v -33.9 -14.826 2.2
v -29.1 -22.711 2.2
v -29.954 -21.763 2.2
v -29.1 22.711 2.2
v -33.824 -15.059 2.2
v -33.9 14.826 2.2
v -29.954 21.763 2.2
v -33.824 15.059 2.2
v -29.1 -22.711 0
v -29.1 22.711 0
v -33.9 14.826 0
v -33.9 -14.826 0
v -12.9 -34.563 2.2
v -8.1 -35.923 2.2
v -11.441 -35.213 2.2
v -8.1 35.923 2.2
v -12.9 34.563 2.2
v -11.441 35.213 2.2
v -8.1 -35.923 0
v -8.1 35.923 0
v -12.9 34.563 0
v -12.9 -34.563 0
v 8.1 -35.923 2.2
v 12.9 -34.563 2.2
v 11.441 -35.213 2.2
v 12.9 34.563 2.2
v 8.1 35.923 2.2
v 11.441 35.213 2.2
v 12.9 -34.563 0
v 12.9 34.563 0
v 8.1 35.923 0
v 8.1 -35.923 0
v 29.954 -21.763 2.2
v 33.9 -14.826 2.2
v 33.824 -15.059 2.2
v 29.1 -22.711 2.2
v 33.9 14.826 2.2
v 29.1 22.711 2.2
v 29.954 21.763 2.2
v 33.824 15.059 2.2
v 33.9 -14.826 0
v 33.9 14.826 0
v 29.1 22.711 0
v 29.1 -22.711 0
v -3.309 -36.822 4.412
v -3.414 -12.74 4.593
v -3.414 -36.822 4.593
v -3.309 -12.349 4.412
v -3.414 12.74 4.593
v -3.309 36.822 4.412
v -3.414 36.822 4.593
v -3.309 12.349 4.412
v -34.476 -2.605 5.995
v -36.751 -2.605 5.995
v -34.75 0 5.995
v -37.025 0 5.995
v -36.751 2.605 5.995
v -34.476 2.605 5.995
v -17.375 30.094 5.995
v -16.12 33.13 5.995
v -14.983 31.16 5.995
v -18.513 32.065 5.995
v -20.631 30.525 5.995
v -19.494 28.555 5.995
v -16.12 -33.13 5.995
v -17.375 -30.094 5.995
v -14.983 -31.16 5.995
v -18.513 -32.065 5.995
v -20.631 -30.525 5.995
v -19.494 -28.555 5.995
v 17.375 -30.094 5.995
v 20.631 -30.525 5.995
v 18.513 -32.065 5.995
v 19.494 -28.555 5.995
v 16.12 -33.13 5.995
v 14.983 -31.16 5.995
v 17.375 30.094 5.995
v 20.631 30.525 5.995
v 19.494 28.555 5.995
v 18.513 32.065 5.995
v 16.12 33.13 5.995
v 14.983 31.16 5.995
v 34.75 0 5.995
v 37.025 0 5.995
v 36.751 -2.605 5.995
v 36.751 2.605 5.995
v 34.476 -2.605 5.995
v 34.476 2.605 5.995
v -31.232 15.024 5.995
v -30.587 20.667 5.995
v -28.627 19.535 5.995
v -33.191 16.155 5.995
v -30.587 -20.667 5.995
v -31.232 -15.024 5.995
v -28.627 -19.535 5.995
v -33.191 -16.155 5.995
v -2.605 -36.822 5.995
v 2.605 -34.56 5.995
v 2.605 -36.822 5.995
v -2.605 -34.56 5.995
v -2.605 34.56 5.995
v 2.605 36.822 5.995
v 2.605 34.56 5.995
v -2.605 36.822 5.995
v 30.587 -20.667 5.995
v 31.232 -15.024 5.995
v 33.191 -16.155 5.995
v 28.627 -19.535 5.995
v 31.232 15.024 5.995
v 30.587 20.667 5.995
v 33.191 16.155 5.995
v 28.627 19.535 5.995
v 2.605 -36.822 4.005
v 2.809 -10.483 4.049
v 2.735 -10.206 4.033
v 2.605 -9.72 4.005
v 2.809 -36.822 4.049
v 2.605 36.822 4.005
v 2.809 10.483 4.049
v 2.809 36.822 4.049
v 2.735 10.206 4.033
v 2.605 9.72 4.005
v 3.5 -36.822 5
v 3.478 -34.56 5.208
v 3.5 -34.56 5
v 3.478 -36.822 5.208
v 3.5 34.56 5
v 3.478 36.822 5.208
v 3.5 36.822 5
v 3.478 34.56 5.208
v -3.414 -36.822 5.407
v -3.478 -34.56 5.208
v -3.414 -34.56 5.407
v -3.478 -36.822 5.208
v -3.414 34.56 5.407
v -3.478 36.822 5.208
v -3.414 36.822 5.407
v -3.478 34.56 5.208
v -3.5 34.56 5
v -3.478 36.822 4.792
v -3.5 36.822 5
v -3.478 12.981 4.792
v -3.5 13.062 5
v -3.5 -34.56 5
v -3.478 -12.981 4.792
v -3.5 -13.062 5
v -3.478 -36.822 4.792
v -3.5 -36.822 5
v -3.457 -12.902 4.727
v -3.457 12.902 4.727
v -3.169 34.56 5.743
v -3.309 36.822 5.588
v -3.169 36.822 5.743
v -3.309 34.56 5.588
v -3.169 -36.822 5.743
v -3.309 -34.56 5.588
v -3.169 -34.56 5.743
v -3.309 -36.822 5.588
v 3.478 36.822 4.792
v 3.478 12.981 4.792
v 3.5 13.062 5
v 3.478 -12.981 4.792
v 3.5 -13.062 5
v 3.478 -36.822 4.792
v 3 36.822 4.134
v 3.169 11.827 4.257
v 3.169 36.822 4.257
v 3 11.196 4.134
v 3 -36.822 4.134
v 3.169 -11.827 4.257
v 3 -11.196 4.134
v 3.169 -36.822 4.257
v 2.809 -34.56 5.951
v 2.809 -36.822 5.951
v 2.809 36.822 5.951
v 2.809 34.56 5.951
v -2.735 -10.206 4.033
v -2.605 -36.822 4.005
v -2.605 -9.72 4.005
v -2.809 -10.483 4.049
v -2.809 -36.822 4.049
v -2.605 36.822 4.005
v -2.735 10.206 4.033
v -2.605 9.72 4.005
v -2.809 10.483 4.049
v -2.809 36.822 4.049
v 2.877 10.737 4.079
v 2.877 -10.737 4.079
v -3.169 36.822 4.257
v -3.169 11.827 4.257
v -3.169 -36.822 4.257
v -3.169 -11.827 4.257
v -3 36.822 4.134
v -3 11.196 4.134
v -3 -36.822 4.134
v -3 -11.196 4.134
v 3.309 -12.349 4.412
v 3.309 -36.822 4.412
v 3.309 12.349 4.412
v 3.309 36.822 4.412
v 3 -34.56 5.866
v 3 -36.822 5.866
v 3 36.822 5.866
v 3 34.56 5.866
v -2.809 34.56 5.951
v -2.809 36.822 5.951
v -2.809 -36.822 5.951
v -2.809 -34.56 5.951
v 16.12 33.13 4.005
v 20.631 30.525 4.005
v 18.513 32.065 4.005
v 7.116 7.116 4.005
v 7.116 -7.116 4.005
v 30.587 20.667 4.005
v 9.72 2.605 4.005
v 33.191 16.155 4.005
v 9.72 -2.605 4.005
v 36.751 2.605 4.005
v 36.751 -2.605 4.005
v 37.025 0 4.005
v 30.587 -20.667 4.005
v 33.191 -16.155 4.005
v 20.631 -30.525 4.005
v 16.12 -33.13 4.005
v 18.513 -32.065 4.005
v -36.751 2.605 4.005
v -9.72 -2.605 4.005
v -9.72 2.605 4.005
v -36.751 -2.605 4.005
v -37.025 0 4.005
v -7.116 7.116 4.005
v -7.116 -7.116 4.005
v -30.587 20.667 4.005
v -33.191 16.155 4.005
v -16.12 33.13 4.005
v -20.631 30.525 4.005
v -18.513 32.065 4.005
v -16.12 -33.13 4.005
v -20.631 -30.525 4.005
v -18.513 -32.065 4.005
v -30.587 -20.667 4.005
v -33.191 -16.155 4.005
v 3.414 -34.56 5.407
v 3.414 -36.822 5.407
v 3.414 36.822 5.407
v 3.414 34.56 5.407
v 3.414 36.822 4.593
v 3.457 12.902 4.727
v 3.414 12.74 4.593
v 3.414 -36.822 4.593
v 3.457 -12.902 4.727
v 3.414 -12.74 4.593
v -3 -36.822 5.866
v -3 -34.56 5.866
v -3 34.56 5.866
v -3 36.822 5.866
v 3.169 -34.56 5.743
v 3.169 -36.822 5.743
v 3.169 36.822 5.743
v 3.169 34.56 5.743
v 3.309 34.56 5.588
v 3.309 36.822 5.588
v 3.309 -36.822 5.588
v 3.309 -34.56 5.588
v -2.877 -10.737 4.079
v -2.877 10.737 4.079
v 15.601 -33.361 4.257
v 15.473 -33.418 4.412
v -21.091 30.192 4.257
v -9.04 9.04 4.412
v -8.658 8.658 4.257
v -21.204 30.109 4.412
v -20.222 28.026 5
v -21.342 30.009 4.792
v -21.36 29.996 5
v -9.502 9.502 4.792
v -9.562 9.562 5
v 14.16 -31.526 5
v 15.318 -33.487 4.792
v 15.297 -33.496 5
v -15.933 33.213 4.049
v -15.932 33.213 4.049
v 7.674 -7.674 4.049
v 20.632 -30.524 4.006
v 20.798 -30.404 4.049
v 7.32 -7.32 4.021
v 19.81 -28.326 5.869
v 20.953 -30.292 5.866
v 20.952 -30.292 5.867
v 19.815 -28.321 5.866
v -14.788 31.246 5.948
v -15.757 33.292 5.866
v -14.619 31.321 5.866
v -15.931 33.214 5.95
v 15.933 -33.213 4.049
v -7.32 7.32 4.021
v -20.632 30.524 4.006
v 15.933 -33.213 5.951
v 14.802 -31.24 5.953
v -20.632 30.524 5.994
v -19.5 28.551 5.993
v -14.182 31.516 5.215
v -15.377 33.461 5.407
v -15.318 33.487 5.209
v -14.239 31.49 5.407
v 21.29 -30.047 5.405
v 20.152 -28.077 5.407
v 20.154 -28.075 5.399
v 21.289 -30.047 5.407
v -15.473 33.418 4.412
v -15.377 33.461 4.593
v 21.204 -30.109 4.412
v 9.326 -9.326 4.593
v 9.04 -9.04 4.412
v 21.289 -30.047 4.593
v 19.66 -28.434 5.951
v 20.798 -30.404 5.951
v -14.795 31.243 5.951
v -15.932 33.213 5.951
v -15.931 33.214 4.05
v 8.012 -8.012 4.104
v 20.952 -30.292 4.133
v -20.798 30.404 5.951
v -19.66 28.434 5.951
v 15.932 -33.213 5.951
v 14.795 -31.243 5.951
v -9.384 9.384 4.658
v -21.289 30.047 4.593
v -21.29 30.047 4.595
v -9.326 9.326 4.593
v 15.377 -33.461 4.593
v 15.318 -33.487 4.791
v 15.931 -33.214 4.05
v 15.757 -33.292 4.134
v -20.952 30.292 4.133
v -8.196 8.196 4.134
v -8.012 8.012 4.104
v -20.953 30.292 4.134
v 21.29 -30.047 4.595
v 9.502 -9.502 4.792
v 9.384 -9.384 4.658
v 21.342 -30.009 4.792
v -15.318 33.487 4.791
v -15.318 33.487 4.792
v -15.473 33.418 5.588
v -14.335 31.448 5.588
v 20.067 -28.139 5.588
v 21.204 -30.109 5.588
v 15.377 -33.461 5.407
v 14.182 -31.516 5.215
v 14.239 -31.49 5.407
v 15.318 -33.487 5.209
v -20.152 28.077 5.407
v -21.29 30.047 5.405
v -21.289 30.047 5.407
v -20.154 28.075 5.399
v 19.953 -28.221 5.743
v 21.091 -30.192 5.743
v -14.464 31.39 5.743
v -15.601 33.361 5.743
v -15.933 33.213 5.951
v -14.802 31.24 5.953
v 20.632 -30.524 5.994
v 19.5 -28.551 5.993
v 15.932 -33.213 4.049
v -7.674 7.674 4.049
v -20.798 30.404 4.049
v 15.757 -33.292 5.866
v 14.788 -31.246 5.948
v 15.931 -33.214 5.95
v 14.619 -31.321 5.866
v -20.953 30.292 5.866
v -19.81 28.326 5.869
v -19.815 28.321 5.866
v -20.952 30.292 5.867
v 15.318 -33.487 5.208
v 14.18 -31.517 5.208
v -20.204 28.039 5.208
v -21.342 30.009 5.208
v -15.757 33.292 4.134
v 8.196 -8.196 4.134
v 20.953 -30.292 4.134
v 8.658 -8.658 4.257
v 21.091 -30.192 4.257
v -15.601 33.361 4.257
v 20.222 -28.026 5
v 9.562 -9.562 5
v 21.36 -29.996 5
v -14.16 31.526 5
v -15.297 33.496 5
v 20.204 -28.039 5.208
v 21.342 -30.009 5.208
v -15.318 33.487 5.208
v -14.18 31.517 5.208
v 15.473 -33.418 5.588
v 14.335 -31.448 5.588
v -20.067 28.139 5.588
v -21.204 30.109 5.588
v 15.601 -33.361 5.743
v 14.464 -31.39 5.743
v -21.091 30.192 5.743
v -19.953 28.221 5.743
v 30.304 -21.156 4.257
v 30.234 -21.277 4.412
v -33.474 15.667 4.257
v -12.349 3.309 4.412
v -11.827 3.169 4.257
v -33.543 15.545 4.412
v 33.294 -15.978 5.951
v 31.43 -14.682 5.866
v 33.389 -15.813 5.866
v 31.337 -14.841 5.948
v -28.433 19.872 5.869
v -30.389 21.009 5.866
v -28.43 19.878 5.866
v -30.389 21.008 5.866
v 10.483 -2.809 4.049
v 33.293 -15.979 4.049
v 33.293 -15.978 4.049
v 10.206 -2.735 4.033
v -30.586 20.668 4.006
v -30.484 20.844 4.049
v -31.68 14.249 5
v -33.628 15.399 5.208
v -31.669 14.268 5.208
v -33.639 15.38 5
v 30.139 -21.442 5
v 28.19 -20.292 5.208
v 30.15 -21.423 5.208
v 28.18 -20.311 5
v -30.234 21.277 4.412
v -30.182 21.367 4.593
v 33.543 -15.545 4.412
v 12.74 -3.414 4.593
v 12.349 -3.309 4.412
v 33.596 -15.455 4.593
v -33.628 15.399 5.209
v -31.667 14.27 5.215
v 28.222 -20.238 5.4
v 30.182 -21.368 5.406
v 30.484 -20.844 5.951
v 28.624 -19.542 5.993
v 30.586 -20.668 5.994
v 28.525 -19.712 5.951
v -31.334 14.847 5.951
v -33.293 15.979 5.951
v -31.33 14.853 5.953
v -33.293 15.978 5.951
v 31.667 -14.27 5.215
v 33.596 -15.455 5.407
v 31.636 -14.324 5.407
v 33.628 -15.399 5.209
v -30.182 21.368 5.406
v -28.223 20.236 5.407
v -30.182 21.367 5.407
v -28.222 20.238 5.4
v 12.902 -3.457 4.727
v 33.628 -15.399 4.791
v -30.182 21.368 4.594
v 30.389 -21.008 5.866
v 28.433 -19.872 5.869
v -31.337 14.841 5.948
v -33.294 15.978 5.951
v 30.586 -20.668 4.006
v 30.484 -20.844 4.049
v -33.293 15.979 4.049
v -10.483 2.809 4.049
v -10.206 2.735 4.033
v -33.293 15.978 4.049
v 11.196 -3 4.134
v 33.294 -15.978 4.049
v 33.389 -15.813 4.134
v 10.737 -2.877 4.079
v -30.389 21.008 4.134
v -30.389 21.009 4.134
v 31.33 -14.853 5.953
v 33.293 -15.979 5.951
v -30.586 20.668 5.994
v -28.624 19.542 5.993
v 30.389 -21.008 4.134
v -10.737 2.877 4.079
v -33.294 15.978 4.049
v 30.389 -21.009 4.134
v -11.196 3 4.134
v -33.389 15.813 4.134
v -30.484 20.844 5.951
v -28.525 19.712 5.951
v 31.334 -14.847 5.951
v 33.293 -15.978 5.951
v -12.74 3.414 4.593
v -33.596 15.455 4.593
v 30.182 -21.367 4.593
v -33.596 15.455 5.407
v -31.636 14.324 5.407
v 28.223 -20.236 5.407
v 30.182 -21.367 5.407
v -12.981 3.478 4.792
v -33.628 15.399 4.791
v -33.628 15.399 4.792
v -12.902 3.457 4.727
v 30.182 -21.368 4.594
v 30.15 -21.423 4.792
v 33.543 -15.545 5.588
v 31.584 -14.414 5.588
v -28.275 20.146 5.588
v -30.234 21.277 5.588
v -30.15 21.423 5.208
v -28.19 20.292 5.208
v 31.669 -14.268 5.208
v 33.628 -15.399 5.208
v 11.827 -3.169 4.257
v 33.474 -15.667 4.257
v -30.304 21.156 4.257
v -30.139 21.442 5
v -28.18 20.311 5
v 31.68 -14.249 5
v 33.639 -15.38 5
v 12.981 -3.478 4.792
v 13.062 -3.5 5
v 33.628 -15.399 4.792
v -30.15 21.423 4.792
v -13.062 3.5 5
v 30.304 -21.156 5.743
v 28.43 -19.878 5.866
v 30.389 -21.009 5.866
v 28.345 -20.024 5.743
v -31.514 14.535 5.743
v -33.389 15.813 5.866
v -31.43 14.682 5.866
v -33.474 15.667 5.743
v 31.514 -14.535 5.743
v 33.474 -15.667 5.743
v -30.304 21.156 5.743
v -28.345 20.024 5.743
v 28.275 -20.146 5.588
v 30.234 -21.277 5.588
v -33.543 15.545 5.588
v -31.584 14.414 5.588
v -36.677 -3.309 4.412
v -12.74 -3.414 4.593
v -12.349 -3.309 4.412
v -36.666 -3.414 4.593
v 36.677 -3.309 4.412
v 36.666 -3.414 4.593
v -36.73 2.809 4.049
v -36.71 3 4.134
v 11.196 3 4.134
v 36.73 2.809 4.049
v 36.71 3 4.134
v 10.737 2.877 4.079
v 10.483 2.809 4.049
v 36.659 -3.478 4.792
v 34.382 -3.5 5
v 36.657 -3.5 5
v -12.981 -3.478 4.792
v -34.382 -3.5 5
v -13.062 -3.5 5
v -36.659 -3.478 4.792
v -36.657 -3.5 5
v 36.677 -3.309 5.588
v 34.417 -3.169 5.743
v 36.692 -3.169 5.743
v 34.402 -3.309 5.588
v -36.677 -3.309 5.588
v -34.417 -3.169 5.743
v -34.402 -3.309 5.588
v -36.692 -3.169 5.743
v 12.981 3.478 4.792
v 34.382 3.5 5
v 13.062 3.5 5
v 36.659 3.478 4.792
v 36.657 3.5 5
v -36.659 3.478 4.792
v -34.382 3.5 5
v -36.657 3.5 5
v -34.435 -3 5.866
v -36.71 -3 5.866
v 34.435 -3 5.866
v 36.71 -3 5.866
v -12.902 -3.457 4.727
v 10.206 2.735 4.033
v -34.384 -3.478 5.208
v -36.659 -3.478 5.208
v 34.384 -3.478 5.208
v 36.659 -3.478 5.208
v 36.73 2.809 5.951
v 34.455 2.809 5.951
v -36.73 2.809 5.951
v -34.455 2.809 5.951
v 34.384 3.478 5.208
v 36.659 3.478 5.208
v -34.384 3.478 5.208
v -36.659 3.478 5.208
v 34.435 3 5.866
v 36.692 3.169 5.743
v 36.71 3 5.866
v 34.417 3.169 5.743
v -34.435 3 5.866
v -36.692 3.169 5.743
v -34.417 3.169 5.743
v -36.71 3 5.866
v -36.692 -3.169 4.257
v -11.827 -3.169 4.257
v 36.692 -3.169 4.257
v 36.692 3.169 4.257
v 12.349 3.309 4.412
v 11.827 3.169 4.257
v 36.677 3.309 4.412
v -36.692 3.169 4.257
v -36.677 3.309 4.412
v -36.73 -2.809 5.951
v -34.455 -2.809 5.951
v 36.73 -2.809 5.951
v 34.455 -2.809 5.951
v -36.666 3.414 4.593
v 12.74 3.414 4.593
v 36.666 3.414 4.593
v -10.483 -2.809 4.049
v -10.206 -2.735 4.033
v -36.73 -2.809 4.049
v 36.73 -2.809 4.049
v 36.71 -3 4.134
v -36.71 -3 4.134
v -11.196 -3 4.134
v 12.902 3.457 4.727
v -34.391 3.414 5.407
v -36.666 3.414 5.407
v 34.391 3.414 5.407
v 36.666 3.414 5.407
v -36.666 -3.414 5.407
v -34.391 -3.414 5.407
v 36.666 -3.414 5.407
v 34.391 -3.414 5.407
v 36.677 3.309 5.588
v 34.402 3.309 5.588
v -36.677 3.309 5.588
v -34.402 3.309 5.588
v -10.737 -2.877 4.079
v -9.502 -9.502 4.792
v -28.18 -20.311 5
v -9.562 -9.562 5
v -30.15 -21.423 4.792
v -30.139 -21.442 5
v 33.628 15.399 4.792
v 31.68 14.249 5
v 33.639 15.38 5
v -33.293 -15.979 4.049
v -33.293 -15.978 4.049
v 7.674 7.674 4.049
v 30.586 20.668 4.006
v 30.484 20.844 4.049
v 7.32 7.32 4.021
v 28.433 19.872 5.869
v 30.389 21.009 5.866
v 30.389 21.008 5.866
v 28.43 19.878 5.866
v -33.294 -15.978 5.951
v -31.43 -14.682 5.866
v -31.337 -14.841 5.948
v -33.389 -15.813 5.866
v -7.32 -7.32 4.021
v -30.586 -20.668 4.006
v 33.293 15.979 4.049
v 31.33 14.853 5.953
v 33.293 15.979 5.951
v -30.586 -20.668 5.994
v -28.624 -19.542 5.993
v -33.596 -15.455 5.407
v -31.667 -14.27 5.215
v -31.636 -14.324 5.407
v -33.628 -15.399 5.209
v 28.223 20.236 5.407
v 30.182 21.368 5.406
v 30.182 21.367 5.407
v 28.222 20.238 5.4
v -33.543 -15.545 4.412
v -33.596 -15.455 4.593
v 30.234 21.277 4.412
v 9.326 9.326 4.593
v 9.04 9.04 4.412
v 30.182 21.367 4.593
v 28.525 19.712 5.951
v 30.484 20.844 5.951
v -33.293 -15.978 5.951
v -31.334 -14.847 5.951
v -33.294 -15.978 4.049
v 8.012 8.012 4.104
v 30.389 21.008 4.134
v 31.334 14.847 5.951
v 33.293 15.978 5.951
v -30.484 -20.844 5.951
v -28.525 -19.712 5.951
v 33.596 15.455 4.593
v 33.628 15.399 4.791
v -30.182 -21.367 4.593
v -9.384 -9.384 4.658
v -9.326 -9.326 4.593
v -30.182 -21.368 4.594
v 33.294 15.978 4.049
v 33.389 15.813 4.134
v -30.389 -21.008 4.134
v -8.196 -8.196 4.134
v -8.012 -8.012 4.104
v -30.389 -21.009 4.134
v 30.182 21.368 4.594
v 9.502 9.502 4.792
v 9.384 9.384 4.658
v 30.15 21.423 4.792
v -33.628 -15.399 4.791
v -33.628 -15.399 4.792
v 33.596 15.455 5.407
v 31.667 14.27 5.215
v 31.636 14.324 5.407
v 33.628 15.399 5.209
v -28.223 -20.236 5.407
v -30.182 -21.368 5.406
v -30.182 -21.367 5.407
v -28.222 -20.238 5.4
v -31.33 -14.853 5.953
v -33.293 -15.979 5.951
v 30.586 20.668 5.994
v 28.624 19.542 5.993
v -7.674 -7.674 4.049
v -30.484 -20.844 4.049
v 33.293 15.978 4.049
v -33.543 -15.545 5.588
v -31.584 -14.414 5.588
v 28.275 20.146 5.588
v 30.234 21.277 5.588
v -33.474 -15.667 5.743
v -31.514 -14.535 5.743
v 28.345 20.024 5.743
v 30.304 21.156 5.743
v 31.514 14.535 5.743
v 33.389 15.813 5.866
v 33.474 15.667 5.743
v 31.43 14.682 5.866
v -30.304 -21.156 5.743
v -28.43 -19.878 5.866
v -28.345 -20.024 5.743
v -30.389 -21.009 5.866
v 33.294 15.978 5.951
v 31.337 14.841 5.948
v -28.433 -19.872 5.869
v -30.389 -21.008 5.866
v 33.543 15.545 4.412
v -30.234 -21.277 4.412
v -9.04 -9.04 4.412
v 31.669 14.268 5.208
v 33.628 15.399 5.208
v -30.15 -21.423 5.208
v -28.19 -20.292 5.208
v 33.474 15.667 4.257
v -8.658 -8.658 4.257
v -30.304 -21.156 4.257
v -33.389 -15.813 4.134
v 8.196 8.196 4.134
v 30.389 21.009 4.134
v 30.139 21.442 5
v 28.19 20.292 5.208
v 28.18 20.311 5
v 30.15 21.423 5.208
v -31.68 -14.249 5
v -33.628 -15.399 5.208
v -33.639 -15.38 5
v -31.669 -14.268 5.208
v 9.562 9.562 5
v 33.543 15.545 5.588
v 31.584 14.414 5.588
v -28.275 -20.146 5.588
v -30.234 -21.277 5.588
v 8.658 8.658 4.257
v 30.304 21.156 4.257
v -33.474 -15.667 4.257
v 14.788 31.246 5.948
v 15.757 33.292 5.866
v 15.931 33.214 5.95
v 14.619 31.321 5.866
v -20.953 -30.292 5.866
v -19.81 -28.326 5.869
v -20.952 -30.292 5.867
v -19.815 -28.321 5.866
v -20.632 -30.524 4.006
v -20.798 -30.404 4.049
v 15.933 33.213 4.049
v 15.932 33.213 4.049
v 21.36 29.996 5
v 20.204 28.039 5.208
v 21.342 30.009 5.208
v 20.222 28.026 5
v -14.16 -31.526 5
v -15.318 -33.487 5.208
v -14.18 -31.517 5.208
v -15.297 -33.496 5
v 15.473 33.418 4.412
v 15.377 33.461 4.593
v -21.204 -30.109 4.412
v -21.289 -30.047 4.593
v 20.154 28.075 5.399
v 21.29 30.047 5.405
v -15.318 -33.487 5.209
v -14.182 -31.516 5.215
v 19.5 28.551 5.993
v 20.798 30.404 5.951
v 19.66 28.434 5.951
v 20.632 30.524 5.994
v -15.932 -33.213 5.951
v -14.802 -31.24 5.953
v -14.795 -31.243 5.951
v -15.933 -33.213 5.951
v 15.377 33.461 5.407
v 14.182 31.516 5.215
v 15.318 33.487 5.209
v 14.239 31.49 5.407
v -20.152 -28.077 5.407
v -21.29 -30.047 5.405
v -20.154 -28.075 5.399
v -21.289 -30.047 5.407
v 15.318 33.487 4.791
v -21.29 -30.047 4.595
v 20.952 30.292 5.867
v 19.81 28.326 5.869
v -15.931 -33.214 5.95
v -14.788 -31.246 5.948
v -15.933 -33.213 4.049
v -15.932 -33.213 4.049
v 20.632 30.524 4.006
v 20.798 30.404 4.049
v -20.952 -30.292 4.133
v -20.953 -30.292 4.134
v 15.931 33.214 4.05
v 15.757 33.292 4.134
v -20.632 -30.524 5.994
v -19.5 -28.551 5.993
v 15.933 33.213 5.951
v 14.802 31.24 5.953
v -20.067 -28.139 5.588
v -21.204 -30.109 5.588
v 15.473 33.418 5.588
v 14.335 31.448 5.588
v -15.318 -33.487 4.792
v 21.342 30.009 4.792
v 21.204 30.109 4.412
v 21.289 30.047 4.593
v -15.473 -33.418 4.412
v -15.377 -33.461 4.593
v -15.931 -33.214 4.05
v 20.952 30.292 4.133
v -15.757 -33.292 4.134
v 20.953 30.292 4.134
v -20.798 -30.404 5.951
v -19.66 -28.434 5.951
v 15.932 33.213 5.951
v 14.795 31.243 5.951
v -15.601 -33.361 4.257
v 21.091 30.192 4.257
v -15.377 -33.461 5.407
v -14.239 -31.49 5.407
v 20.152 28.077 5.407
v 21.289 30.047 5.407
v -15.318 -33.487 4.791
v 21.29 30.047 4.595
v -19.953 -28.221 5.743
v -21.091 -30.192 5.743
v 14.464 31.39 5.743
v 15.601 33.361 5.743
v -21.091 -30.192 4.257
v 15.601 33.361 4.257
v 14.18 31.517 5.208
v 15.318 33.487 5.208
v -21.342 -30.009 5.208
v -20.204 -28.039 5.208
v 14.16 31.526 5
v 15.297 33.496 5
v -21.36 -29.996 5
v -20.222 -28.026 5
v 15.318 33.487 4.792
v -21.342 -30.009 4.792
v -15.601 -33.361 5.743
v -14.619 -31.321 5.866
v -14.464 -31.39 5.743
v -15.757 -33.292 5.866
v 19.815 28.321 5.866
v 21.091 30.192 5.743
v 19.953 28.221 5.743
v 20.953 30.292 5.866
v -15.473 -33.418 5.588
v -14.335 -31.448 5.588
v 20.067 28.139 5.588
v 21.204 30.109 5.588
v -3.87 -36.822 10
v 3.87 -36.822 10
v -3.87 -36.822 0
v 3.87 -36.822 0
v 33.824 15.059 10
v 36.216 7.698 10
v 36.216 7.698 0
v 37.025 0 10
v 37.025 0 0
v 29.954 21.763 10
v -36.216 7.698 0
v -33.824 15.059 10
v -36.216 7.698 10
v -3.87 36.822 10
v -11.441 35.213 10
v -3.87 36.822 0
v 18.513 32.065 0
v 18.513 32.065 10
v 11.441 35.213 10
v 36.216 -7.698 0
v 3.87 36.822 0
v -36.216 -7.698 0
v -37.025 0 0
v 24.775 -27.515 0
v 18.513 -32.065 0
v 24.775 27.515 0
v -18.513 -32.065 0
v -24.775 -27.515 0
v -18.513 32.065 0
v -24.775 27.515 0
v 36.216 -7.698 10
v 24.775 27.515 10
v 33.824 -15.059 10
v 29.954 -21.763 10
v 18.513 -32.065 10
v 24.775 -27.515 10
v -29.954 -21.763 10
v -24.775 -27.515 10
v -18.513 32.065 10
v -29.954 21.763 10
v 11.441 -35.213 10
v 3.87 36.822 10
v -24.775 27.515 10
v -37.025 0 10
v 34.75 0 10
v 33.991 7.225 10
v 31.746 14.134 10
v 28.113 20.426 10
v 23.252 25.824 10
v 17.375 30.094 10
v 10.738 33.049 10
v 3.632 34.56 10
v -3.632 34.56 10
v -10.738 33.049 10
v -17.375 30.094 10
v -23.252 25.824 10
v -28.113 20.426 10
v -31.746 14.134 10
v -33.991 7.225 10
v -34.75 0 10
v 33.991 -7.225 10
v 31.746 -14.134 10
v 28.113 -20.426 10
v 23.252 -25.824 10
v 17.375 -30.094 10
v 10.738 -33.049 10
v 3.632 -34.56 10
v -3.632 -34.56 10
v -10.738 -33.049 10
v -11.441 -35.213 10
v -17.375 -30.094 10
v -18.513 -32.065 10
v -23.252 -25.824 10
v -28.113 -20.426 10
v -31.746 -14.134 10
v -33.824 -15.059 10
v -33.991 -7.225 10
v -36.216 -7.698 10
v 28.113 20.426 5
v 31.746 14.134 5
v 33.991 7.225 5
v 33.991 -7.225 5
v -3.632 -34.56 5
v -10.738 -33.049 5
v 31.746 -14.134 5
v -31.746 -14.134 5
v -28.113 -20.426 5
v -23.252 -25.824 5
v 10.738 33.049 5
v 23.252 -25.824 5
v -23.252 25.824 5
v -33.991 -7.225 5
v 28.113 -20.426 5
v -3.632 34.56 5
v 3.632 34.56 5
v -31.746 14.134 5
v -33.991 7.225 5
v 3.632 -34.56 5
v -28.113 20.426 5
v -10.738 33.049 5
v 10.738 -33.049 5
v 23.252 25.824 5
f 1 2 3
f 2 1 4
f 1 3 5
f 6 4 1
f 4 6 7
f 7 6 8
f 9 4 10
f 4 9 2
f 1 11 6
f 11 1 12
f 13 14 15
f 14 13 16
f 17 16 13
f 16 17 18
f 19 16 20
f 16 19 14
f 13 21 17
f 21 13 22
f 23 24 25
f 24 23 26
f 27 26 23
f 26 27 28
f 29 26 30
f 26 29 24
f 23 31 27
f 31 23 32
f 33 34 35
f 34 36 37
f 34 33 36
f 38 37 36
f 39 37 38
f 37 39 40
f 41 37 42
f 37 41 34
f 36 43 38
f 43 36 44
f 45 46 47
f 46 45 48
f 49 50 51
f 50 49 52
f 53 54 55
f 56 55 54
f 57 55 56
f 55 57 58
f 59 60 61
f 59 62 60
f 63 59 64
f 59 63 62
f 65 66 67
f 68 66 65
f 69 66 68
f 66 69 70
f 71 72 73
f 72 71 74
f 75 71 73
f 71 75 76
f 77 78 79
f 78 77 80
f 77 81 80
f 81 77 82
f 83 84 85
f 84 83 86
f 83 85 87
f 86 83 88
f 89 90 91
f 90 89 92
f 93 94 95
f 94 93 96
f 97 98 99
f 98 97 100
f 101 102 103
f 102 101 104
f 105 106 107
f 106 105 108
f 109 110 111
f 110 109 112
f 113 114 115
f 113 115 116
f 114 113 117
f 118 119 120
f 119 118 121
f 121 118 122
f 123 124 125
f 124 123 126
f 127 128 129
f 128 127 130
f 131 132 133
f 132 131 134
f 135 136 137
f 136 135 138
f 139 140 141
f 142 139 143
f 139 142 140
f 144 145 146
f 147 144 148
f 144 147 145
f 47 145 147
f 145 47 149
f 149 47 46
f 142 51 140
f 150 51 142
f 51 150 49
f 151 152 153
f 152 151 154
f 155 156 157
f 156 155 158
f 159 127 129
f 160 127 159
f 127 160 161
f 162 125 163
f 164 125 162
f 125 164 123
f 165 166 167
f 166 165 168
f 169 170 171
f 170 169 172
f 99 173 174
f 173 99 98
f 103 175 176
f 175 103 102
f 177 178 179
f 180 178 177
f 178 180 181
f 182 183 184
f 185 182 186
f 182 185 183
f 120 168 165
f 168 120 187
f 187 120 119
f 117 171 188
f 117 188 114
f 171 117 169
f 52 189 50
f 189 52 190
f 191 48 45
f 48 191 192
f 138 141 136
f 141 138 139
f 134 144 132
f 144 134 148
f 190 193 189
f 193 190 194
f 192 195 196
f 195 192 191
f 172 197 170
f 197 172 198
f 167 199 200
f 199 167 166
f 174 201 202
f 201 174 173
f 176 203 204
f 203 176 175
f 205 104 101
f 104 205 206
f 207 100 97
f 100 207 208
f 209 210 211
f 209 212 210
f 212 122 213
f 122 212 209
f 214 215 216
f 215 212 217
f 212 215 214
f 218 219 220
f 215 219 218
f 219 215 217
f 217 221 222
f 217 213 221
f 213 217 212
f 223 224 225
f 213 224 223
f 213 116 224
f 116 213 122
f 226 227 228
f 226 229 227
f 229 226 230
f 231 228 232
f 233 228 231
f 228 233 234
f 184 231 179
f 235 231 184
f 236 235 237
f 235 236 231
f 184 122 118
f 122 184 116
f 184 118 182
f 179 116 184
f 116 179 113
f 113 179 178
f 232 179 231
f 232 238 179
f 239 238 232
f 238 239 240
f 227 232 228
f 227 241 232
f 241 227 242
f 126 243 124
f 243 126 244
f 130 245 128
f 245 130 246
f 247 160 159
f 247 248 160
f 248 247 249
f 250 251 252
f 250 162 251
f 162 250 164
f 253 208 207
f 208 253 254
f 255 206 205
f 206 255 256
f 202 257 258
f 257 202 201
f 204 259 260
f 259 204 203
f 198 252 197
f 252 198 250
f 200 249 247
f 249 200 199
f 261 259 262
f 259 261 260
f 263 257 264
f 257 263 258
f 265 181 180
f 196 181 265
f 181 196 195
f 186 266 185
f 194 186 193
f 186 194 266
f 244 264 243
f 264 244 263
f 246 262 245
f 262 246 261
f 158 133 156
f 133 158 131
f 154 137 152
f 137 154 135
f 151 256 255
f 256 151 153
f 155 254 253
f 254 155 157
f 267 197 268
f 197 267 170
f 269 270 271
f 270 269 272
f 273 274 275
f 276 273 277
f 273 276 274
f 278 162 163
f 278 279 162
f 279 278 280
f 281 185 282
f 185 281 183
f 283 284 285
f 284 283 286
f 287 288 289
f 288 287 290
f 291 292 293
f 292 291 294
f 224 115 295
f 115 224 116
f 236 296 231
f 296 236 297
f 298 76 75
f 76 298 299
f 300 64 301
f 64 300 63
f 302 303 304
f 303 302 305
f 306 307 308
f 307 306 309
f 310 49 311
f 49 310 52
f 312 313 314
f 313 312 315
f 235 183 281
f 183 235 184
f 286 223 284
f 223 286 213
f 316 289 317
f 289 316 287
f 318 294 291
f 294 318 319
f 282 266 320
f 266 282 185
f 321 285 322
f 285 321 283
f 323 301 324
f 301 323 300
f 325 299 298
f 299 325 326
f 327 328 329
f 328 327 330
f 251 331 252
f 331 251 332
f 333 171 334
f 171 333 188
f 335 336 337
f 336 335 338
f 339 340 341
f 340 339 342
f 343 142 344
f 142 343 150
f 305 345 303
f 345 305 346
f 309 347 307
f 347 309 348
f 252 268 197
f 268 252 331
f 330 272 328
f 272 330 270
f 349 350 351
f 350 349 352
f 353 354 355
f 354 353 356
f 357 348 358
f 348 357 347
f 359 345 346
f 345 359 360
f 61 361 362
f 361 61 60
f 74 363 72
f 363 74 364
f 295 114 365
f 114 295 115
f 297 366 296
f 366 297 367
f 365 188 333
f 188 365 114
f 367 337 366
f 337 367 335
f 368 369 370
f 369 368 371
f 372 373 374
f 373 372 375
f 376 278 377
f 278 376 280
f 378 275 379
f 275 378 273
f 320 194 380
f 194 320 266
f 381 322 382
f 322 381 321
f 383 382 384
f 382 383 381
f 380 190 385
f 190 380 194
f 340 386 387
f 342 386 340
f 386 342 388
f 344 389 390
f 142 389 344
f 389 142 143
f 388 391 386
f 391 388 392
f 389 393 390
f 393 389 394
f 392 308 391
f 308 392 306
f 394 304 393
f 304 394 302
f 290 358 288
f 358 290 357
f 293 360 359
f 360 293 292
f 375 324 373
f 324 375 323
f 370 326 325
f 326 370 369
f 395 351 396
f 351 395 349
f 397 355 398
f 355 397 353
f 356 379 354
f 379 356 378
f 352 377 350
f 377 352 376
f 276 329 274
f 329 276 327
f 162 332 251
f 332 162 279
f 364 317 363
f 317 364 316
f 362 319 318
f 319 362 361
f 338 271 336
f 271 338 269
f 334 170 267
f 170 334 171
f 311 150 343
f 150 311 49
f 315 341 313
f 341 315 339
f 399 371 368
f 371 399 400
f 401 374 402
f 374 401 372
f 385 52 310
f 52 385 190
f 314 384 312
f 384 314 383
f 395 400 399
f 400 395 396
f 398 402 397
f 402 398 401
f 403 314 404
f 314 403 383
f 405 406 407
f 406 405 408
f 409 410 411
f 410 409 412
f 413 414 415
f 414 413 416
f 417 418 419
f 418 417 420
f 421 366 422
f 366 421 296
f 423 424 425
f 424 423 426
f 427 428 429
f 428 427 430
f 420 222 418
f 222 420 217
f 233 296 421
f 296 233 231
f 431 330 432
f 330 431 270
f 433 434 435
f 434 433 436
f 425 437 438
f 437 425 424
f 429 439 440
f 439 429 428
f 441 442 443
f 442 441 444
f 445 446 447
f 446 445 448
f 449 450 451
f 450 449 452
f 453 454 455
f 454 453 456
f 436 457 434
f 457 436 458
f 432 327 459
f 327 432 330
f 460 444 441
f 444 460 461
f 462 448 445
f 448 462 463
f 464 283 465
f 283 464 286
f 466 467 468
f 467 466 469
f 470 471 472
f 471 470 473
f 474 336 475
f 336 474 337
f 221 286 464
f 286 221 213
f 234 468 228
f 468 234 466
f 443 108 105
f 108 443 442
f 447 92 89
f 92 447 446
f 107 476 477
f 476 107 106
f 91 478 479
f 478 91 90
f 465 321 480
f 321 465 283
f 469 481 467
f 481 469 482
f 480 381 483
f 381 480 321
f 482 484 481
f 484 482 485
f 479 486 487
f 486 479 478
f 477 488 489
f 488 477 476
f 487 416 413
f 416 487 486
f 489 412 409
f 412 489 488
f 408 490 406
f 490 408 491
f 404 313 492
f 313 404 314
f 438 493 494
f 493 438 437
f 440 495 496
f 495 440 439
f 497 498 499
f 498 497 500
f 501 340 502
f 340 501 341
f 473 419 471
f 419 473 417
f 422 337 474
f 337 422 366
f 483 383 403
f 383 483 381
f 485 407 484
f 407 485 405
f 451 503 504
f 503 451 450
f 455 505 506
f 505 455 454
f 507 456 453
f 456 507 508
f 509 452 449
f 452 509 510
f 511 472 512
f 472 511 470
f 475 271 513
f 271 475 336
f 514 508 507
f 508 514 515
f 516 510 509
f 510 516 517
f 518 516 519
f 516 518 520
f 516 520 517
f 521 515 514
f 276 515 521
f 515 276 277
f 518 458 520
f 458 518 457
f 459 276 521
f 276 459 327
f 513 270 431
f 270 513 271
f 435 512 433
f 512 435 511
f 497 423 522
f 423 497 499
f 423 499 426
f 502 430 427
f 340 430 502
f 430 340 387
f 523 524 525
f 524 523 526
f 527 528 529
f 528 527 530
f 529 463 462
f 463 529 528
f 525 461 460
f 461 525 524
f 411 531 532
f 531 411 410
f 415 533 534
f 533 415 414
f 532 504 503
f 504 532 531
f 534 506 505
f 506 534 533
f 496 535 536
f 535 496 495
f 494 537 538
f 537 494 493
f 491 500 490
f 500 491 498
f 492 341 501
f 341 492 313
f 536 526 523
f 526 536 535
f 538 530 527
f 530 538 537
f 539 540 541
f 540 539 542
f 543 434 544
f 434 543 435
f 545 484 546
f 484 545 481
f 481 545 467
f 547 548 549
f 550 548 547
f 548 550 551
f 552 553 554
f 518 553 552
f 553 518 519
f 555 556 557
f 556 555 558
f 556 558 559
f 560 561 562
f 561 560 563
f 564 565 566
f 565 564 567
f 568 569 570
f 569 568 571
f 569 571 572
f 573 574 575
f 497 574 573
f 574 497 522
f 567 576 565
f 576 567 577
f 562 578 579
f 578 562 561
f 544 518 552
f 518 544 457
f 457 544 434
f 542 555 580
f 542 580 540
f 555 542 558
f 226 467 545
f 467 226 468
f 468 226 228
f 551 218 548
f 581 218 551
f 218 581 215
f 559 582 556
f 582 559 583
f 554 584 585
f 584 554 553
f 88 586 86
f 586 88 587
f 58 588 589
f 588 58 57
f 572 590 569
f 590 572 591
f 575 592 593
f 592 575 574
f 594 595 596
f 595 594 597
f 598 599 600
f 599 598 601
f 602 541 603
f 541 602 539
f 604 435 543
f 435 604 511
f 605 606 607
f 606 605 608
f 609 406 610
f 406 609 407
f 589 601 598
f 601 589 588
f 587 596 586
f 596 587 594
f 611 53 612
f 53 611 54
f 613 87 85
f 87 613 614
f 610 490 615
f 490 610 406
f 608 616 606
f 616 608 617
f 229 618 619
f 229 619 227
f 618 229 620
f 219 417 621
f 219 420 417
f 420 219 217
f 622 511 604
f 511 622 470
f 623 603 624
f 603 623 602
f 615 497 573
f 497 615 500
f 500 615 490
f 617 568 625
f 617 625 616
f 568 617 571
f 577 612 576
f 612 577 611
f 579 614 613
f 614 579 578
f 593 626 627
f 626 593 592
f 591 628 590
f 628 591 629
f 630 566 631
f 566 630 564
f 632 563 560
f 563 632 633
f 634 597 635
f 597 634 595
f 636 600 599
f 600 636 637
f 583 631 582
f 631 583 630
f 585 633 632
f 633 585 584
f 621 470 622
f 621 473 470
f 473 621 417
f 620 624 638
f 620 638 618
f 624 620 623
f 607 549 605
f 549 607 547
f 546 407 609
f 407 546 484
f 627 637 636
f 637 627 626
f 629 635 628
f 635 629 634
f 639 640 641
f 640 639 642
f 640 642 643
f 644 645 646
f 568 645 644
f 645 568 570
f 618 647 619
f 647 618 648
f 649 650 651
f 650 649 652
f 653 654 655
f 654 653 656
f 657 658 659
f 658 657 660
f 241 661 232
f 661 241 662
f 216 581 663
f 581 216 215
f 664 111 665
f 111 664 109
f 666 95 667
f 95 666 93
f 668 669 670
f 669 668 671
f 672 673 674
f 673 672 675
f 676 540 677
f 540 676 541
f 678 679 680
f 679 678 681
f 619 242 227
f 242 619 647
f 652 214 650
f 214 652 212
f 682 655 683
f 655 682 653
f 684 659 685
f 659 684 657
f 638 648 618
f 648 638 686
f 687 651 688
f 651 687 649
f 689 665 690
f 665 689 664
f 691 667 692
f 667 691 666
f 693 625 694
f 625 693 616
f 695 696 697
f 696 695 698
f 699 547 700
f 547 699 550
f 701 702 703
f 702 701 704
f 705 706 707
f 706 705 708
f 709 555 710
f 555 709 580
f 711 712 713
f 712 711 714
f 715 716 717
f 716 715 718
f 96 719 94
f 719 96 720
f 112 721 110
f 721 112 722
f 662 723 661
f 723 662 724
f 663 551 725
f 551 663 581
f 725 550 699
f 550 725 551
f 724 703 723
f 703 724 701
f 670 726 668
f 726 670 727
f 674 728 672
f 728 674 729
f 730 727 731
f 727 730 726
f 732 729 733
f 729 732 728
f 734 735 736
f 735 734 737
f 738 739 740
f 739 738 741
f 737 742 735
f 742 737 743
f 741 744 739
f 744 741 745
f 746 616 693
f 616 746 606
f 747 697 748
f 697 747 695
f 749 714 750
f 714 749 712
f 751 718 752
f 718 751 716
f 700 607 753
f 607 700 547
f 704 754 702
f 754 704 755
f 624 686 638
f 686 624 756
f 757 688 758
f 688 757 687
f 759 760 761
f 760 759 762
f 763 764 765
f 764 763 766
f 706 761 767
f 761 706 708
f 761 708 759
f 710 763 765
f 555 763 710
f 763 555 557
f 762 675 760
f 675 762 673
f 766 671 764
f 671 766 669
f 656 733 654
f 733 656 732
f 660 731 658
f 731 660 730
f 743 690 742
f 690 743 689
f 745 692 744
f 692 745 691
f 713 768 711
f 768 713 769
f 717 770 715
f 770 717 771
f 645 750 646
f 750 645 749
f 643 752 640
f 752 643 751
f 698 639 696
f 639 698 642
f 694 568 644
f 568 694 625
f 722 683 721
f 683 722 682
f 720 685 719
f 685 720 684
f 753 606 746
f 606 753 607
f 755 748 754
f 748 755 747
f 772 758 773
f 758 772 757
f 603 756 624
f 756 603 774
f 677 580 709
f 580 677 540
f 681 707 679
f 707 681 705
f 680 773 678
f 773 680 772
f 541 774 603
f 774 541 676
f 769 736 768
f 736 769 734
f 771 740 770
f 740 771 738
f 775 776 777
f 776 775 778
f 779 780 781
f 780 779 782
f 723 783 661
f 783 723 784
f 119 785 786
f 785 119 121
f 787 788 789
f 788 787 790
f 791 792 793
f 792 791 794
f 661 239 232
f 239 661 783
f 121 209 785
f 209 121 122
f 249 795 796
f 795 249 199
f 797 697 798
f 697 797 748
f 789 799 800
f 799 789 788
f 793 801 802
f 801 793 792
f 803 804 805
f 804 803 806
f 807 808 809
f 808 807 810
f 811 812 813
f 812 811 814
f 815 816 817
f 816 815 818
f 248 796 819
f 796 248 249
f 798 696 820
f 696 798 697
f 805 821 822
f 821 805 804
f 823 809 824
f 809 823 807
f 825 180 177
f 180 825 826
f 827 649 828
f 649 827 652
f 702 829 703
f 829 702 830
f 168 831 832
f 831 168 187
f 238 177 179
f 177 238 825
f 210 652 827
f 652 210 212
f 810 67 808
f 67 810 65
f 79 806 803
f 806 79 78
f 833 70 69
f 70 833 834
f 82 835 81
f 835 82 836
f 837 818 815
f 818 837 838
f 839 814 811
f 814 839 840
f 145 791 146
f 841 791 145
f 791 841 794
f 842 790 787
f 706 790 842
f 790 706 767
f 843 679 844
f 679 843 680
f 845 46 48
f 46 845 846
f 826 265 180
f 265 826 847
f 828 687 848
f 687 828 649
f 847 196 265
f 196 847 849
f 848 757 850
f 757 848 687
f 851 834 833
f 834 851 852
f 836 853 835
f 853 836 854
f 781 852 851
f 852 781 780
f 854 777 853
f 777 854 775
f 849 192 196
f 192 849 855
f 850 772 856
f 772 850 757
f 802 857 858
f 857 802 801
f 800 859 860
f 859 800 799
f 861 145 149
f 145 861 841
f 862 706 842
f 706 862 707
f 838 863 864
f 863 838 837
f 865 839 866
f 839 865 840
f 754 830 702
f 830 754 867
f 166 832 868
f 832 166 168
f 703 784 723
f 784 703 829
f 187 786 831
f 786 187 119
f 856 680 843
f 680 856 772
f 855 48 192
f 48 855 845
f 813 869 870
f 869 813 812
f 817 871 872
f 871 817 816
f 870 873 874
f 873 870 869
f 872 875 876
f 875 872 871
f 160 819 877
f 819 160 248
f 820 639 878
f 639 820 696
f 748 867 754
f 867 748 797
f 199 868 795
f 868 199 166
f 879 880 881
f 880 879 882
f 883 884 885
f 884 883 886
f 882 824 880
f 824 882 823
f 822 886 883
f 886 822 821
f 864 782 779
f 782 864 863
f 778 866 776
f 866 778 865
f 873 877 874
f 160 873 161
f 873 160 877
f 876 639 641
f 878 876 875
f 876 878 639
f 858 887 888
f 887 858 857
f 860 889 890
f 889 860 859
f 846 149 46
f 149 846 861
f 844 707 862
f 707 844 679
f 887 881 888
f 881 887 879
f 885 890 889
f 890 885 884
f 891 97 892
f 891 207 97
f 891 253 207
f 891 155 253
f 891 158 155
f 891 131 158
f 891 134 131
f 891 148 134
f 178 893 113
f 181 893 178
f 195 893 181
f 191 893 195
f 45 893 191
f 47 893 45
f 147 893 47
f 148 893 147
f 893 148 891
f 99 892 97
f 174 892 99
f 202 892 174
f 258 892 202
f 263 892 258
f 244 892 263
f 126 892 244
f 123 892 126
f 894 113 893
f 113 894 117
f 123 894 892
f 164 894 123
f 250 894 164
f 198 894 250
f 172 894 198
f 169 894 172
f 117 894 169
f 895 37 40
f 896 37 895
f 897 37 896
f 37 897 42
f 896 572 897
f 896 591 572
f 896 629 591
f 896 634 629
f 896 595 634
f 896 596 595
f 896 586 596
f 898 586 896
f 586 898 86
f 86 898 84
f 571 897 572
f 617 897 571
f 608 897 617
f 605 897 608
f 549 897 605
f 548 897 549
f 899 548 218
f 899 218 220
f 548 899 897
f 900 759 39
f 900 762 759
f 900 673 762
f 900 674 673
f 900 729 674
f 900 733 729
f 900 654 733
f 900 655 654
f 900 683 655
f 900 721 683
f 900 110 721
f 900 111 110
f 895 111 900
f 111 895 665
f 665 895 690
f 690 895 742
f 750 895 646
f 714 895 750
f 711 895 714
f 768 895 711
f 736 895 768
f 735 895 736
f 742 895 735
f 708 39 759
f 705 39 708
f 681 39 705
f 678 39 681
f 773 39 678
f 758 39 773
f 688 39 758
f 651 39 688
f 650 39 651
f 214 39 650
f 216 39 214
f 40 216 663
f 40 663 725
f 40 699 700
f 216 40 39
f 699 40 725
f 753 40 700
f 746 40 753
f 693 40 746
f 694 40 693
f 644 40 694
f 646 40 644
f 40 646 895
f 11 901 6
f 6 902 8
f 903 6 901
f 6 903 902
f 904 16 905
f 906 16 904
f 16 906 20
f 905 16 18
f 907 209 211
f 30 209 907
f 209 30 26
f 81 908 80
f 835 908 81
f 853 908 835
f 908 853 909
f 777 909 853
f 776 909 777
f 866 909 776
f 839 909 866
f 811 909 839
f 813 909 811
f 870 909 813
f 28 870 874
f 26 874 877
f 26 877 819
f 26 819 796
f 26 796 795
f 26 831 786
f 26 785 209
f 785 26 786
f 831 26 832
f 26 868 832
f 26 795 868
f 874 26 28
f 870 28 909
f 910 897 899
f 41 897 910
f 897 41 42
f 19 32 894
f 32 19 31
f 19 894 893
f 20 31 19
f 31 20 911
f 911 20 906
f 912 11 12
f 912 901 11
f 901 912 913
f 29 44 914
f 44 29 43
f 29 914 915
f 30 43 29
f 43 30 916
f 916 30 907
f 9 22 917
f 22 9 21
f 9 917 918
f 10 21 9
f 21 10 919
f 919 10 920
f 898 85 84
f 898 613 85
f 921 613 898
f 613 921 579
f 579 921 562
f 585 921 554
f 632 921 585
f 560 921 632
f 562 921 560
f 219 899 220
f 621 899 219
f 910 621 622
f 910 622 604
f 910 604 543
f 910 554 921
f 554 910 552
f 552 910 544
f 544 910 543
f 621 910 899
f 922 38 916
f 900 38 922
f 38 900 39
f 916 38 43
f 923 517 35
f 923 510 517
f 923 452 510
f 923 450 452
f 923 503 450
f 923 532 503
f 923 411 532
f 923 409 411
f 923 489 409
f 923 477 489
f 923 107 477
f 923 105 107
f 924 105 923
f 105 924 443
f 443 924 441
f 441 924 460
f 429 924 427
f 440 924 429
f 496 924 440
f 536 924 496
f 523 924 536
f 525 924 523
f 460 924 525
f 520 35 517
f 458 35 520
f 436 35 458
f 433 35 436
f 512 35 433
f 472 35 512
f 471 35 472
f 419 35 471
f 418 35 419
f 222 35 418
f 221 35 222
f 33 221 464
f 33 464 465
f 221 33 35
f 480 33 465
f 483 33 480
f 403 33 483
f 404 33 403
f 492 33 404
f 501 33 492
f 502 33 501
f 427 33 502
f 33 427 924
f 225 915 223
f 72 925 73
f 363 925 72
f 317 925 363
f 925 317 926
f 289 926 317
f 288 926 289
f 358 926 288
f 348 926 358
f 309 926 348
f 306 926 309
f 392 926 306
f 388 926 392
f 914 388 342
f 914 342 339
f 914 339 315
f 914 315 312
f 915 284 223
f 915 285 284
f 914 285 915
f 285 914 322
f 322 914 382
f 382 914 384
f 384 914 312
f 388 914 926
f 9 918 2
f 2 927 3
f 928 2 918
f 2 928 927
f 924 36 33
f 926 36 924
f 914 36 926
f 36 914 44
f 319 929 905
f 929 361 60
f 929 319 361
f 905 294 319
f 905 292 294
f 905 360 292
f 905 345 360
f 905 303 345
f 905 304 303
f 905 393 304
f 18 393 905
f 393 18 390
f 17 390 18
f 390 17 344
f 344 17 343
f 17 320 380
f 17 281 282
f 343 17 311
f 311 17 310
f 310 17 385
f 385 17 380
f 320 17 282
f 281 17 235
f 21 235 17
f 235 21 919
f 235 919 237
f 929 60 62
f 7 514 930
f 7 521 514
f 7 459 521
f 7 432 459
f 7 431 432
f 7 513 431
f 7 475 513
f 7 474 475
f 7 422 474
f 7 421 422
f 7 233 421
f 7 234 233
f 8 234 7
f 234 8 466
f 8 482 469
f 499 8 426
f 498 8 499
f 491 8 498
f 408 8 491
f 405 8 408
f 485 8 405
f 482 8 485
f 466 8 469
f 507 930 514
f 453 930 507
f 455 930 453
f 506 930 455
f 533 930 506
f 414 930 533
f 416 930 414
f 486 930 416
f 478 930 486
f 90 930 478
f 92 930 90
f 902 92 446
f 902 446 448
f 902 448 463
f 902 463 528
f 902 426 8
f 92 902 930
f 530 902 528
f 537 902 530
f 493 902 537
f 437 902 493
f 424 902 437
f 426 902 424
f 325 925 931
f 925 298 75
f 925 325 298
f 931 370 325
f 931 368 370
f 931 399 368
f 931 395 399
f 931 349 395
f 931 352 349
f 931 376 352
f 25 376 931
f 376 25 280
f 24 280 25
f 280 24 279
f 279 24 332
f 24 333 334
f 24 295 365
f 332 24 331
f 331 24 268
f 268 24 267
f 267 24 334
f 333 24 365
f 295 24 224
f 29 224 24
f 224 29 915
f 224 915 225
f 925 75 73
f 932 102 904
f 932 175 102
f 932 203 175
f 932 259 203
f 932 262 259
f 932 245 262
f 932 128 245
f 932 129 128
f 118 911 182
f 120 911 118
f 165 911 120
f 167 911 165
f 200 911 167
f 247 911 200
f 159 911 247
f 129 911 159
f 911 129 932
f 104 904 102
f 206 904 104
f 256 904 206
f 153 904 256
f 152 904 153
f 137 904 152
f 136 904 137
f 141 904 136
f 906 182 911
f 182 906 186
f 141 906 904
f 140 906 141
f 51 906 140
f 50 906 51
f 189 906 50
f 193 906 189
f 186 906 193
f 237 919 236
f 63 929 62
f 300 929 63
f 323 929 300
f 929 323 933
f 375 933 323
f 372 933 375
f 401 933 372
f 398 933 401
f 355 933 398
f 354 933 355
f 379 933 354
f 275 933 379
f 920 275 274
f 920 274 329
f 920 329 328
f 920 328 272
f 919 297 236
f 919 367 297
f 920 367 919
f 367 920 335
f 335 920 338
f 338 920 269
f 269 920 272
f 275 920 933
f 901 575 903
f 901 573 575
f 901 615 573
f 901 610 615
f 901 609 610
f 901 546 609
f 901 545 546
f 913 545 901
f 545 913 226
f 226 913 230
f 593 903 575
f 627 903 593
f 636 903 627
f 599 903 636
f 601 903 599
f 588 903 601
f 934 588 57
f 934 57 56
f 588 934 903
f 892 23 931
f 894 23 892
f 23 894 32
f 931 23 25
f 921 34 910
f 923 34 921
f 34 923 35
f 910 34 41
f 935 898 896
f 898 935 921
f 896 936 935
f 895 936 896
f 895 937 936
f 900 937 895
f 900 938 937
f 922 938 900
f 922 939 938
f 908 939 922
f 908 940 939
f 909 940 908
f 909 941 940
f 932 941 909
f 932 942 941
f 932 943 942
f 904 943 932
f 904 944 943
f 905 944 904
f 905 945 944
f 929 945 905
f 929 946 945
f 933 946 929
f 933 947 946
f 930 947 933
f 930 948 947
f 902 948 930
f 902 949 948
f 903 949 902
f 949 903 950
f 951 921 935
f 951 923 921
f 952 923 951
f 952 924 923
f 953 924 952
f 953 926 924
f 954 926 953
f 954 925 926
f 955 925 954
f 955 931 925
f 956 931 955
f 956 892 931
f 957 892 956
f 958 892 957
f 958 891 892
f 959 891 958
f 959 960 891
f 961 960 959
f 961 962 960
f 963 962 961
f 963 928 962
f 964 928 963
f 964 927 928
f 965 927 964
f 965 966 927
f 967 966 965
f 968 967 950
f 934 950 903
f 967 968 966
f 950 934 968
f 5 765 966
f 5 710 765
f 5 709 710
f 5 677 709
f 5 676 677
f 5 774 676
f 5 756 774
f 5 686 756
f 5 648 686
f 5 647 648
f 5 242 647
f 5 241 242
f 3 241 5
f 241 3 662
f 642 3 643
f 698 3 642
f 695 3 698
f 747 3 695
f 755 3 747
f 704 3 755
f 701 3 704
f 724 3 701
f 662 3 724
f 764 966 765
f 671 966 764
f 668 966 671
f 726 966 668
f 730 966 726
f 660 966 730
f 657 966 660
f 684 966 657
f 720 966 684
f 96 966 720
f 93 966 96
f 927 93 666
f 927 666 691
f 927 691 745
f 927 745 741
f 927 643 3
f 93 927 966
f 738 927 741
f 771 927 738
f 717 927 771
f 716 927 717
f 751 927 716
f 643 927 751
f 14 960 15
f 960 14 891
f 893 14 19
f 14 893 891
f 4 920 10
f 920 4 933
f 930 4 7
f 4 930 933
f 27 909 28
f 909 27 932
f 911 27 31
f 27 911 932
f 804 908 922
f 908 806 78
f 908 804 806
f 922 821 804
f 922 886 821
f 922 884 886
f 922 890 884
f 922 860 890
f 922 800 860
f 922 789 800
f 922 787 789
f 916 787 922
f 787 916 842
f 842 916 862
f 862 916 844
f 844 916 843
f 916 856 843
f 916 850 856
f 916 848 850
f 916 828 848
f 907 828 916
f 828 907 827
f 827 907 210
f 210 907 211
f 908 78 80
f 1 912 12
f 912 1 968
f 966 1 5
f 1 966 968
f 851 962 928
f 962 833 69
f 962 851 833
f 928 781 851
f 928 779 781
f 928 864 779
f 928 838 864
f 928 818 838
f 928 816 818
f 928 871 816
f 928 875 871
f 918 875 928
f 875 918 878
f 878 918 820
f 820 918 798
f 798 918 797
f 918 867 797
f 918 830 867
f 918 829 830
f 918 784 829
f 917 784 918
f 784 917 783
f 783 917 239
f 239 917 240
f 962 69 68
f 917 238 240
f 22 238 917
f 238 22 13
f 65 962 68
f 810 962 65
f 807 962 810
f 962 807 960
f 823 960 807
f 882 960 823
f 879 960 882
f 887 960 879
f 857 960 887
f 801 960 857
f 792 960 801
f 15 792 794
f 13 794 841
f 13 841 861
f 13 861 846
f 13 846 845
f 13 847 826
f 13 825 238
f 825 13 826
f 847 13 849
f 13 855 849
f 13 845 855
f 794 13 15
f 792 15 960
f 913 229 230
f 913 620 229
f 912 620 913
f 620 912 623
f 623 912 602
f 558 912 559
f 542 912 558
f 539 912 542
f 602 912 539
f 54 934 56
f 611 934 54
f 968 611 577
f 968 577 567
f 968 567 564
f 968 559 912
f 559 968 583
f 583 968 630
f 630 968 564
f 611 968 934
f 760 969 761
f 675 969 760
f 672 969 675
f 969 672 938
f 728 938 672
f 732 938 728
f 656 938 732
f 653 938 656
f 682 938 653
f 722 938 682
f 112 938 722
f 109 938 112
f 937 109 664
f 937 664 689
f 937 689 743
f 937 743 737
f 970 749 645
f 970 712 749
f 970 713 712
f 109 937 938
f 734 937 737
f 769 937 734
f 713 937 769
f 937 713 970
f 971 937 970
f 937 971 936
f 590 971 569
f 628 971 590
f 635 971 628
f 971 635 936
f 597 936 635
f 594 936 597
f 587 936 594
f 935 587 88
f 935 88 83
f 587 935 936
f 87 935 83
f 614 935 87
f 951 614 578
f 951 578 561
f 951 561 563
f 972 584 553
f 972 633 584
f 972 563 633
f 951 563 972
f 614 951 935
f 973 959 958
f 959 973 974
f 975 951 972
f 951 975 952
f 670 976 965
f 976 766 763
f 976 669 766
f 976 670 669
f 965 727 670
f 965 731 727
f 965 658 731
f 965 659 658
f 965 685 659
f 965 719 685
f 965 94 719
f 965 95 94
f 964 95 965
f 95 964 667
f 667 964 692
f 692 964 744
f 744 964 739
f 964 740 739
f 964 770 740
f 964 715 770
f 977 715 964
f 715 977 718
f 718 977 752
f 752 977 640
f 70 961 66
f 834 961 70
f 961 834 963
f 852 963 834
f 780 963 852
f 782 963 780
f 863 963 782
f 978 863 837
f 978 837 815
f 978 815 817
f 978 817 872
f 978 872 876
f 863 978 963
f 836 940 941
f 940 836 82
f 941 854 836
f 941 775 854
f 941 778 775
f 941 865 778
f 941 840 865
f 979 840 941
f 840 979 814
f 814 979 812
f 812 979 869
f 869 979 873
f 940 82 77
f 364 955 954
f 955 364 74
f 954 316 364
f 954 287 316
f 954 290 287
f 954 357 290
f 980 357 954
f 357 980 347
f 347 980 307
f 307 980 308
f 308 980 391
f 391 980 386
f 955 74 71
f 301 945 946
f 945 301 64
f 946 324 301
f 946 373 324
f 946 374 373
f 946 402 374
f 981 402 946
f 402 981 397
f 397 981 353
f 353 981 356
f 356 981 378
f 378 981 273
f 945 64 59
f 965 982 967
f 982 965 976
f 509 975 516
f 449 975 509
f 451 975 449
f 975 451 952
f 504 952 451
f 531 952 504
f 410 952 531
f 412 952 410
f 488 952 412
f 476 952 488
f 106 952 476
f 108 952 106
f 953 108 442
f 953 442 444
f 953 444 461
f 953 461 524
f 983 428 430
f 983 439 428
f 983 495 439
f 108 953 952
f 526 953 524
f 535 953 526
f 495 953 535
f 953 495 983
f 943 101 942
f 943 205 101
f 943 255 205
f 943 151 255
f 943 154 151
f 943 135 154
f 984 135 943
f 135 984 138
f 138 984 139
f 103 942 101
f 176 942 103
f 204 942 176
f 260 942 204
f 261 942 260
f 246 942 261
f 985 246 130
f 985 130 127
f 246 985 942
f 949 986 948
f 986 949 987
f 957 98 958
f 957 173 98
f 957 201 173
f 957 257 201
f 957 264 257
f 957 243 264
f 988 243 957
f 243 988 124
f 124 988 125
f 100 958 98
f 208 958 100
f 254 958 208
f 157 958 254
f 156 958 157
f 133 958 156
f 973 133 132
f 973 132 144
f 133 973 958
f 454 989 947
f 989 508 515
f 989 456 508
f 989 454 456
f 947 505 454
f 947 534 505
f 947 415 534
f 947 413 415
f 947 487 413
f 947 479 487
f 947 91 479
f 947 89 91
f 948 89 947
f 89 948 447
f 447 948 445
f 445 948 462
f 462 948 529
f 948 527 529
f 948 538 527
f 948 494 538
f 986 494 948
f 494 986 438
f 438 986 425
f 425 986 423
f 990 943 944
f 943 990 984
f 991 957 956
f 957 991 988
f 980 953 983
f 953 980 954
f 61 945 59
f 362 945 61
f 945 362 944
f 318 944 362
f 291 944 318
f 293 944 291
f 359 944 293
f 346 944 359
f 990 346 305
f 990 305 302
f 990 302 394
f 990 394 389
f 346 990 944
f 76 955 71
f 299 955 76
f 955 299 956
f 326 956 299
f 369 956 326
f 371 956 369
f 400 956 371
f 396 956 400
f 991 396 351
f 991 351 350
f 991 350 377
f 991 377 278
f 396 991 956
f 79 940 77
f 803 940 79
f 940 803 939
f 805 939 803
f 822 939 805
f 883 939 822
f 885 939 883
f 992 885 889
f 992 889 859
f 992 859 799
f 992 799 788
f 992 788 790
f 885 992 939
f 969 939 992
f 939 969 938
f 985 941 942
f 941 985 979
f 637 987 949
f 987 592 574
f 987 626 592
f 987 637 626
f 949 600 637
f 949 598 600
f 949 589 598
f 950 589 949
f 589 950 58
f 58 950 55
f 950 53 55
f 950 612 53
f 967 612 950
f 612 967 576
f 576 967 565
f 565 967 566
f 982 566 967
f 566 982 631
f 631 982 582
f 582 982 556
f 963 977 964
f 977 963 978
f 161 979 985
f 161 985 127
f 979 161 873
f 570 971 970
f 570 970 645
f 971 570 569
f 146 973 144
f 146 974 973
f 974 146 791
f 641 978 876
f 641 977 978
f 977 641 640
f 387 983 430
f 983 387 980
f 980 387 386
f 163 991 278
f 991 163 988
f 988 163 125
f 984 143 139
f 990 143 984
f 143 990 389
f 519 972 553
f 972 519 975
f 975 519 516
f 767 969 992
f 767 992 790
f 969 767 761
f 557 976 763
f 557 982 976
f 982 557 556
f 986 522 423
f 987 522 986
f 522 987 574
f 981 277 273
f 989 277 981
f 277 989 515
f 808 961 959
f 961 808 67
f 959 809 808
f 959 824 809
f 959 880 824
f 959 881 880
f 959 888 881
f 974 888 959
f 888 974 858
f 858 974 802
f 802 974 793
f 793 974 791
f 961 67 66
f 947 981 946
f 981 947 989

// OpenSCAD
// file: wire_frame.scad
// -*- mode: SCAD; tab-width: 4; -*-

default_wire_diameter = 2.4;
default_wire_slot_depth = 1;

module wire_frame(spacing,wires,width,diameter=default_wire_diameter,depth=default_wire_slot_depth) {
	translate([-(wires-1)*spacing/2,0,0])
	for (w = [1:wires]) {
		translate([(w-1)*spacing,0,0])
		rotate([90,0,0])
		scale([2,1,1])
		hull() {
			cube([diameter,diameter,width],center=true);
			translate([0,depth,0])
			cube([diameter,diameter,width],center=true);
			// cylinder(r=diameter/2,h=width,center=true,$fs=0.1);
			// translate([0,depth,0])
			// cylinder(r=diameter/2,h=width,center=true,$fs=0.1);
		}
	}
}
// main file
// -*- mode: SCAD; tab-width: 4; -*-

use <wire_frame.scad>

overlap = 0.2;

upper_wire_spacing = 21;
upper_wire_width = 215;
upper_wire_wires = 4;

shave_cream_diameter = 65.5;
shave_cream_height = 122;

dish_height = 10;
dish_diameter = 1.1 * shave_cream_diameter+2;

drain_channel_depth = 2;
drain_channel_width = 5;

part = "dish"; // [dish, drain]

print_part();

module print_part() {
	if (part == "dish") {
		shave_cream_dish();
    } else if (part == "drain") {
		drain_channels();
    }
}

module shave_cream() {
	cylinder(r=shave_cream_diameter/2+2,h=shave_cream_height,center=true,$fs=0.1);
}

module dish_body() {
	cylinder(r=dish_diameter/2,h=dish_height,center=true,$fs=0.1);
}
	
module drain_channels() {
	for (a = [0:30:330]) {
		rotate([90,0,a])
		hull() {
			translate([ drain_channel_width/2,0,0])
			cylinder(r=drain_channel_depth/2,h=dish_diameter+overlap*2,center=true,$fs=0.1);
			translate([-drain_channel_width/2,0,0])
			cylinder(r=drain_channel_depth/2,h=dish_diameter+overlap*2,center=true,$fs=0.1);
		}
	}
}

module shave_cream_dish() {
	difference() {
		translate([0,0,dish_height/2])
		dish_body();

		translate([0,0,shave_cream_height/2+dish_height/2])
		shave_cream();

		wire_frame(upper_wire_spacing,upper_wire_wires,upper_wire_width);

		translate([0,0,dish_height/2])
		drain_channels();
	}
}
